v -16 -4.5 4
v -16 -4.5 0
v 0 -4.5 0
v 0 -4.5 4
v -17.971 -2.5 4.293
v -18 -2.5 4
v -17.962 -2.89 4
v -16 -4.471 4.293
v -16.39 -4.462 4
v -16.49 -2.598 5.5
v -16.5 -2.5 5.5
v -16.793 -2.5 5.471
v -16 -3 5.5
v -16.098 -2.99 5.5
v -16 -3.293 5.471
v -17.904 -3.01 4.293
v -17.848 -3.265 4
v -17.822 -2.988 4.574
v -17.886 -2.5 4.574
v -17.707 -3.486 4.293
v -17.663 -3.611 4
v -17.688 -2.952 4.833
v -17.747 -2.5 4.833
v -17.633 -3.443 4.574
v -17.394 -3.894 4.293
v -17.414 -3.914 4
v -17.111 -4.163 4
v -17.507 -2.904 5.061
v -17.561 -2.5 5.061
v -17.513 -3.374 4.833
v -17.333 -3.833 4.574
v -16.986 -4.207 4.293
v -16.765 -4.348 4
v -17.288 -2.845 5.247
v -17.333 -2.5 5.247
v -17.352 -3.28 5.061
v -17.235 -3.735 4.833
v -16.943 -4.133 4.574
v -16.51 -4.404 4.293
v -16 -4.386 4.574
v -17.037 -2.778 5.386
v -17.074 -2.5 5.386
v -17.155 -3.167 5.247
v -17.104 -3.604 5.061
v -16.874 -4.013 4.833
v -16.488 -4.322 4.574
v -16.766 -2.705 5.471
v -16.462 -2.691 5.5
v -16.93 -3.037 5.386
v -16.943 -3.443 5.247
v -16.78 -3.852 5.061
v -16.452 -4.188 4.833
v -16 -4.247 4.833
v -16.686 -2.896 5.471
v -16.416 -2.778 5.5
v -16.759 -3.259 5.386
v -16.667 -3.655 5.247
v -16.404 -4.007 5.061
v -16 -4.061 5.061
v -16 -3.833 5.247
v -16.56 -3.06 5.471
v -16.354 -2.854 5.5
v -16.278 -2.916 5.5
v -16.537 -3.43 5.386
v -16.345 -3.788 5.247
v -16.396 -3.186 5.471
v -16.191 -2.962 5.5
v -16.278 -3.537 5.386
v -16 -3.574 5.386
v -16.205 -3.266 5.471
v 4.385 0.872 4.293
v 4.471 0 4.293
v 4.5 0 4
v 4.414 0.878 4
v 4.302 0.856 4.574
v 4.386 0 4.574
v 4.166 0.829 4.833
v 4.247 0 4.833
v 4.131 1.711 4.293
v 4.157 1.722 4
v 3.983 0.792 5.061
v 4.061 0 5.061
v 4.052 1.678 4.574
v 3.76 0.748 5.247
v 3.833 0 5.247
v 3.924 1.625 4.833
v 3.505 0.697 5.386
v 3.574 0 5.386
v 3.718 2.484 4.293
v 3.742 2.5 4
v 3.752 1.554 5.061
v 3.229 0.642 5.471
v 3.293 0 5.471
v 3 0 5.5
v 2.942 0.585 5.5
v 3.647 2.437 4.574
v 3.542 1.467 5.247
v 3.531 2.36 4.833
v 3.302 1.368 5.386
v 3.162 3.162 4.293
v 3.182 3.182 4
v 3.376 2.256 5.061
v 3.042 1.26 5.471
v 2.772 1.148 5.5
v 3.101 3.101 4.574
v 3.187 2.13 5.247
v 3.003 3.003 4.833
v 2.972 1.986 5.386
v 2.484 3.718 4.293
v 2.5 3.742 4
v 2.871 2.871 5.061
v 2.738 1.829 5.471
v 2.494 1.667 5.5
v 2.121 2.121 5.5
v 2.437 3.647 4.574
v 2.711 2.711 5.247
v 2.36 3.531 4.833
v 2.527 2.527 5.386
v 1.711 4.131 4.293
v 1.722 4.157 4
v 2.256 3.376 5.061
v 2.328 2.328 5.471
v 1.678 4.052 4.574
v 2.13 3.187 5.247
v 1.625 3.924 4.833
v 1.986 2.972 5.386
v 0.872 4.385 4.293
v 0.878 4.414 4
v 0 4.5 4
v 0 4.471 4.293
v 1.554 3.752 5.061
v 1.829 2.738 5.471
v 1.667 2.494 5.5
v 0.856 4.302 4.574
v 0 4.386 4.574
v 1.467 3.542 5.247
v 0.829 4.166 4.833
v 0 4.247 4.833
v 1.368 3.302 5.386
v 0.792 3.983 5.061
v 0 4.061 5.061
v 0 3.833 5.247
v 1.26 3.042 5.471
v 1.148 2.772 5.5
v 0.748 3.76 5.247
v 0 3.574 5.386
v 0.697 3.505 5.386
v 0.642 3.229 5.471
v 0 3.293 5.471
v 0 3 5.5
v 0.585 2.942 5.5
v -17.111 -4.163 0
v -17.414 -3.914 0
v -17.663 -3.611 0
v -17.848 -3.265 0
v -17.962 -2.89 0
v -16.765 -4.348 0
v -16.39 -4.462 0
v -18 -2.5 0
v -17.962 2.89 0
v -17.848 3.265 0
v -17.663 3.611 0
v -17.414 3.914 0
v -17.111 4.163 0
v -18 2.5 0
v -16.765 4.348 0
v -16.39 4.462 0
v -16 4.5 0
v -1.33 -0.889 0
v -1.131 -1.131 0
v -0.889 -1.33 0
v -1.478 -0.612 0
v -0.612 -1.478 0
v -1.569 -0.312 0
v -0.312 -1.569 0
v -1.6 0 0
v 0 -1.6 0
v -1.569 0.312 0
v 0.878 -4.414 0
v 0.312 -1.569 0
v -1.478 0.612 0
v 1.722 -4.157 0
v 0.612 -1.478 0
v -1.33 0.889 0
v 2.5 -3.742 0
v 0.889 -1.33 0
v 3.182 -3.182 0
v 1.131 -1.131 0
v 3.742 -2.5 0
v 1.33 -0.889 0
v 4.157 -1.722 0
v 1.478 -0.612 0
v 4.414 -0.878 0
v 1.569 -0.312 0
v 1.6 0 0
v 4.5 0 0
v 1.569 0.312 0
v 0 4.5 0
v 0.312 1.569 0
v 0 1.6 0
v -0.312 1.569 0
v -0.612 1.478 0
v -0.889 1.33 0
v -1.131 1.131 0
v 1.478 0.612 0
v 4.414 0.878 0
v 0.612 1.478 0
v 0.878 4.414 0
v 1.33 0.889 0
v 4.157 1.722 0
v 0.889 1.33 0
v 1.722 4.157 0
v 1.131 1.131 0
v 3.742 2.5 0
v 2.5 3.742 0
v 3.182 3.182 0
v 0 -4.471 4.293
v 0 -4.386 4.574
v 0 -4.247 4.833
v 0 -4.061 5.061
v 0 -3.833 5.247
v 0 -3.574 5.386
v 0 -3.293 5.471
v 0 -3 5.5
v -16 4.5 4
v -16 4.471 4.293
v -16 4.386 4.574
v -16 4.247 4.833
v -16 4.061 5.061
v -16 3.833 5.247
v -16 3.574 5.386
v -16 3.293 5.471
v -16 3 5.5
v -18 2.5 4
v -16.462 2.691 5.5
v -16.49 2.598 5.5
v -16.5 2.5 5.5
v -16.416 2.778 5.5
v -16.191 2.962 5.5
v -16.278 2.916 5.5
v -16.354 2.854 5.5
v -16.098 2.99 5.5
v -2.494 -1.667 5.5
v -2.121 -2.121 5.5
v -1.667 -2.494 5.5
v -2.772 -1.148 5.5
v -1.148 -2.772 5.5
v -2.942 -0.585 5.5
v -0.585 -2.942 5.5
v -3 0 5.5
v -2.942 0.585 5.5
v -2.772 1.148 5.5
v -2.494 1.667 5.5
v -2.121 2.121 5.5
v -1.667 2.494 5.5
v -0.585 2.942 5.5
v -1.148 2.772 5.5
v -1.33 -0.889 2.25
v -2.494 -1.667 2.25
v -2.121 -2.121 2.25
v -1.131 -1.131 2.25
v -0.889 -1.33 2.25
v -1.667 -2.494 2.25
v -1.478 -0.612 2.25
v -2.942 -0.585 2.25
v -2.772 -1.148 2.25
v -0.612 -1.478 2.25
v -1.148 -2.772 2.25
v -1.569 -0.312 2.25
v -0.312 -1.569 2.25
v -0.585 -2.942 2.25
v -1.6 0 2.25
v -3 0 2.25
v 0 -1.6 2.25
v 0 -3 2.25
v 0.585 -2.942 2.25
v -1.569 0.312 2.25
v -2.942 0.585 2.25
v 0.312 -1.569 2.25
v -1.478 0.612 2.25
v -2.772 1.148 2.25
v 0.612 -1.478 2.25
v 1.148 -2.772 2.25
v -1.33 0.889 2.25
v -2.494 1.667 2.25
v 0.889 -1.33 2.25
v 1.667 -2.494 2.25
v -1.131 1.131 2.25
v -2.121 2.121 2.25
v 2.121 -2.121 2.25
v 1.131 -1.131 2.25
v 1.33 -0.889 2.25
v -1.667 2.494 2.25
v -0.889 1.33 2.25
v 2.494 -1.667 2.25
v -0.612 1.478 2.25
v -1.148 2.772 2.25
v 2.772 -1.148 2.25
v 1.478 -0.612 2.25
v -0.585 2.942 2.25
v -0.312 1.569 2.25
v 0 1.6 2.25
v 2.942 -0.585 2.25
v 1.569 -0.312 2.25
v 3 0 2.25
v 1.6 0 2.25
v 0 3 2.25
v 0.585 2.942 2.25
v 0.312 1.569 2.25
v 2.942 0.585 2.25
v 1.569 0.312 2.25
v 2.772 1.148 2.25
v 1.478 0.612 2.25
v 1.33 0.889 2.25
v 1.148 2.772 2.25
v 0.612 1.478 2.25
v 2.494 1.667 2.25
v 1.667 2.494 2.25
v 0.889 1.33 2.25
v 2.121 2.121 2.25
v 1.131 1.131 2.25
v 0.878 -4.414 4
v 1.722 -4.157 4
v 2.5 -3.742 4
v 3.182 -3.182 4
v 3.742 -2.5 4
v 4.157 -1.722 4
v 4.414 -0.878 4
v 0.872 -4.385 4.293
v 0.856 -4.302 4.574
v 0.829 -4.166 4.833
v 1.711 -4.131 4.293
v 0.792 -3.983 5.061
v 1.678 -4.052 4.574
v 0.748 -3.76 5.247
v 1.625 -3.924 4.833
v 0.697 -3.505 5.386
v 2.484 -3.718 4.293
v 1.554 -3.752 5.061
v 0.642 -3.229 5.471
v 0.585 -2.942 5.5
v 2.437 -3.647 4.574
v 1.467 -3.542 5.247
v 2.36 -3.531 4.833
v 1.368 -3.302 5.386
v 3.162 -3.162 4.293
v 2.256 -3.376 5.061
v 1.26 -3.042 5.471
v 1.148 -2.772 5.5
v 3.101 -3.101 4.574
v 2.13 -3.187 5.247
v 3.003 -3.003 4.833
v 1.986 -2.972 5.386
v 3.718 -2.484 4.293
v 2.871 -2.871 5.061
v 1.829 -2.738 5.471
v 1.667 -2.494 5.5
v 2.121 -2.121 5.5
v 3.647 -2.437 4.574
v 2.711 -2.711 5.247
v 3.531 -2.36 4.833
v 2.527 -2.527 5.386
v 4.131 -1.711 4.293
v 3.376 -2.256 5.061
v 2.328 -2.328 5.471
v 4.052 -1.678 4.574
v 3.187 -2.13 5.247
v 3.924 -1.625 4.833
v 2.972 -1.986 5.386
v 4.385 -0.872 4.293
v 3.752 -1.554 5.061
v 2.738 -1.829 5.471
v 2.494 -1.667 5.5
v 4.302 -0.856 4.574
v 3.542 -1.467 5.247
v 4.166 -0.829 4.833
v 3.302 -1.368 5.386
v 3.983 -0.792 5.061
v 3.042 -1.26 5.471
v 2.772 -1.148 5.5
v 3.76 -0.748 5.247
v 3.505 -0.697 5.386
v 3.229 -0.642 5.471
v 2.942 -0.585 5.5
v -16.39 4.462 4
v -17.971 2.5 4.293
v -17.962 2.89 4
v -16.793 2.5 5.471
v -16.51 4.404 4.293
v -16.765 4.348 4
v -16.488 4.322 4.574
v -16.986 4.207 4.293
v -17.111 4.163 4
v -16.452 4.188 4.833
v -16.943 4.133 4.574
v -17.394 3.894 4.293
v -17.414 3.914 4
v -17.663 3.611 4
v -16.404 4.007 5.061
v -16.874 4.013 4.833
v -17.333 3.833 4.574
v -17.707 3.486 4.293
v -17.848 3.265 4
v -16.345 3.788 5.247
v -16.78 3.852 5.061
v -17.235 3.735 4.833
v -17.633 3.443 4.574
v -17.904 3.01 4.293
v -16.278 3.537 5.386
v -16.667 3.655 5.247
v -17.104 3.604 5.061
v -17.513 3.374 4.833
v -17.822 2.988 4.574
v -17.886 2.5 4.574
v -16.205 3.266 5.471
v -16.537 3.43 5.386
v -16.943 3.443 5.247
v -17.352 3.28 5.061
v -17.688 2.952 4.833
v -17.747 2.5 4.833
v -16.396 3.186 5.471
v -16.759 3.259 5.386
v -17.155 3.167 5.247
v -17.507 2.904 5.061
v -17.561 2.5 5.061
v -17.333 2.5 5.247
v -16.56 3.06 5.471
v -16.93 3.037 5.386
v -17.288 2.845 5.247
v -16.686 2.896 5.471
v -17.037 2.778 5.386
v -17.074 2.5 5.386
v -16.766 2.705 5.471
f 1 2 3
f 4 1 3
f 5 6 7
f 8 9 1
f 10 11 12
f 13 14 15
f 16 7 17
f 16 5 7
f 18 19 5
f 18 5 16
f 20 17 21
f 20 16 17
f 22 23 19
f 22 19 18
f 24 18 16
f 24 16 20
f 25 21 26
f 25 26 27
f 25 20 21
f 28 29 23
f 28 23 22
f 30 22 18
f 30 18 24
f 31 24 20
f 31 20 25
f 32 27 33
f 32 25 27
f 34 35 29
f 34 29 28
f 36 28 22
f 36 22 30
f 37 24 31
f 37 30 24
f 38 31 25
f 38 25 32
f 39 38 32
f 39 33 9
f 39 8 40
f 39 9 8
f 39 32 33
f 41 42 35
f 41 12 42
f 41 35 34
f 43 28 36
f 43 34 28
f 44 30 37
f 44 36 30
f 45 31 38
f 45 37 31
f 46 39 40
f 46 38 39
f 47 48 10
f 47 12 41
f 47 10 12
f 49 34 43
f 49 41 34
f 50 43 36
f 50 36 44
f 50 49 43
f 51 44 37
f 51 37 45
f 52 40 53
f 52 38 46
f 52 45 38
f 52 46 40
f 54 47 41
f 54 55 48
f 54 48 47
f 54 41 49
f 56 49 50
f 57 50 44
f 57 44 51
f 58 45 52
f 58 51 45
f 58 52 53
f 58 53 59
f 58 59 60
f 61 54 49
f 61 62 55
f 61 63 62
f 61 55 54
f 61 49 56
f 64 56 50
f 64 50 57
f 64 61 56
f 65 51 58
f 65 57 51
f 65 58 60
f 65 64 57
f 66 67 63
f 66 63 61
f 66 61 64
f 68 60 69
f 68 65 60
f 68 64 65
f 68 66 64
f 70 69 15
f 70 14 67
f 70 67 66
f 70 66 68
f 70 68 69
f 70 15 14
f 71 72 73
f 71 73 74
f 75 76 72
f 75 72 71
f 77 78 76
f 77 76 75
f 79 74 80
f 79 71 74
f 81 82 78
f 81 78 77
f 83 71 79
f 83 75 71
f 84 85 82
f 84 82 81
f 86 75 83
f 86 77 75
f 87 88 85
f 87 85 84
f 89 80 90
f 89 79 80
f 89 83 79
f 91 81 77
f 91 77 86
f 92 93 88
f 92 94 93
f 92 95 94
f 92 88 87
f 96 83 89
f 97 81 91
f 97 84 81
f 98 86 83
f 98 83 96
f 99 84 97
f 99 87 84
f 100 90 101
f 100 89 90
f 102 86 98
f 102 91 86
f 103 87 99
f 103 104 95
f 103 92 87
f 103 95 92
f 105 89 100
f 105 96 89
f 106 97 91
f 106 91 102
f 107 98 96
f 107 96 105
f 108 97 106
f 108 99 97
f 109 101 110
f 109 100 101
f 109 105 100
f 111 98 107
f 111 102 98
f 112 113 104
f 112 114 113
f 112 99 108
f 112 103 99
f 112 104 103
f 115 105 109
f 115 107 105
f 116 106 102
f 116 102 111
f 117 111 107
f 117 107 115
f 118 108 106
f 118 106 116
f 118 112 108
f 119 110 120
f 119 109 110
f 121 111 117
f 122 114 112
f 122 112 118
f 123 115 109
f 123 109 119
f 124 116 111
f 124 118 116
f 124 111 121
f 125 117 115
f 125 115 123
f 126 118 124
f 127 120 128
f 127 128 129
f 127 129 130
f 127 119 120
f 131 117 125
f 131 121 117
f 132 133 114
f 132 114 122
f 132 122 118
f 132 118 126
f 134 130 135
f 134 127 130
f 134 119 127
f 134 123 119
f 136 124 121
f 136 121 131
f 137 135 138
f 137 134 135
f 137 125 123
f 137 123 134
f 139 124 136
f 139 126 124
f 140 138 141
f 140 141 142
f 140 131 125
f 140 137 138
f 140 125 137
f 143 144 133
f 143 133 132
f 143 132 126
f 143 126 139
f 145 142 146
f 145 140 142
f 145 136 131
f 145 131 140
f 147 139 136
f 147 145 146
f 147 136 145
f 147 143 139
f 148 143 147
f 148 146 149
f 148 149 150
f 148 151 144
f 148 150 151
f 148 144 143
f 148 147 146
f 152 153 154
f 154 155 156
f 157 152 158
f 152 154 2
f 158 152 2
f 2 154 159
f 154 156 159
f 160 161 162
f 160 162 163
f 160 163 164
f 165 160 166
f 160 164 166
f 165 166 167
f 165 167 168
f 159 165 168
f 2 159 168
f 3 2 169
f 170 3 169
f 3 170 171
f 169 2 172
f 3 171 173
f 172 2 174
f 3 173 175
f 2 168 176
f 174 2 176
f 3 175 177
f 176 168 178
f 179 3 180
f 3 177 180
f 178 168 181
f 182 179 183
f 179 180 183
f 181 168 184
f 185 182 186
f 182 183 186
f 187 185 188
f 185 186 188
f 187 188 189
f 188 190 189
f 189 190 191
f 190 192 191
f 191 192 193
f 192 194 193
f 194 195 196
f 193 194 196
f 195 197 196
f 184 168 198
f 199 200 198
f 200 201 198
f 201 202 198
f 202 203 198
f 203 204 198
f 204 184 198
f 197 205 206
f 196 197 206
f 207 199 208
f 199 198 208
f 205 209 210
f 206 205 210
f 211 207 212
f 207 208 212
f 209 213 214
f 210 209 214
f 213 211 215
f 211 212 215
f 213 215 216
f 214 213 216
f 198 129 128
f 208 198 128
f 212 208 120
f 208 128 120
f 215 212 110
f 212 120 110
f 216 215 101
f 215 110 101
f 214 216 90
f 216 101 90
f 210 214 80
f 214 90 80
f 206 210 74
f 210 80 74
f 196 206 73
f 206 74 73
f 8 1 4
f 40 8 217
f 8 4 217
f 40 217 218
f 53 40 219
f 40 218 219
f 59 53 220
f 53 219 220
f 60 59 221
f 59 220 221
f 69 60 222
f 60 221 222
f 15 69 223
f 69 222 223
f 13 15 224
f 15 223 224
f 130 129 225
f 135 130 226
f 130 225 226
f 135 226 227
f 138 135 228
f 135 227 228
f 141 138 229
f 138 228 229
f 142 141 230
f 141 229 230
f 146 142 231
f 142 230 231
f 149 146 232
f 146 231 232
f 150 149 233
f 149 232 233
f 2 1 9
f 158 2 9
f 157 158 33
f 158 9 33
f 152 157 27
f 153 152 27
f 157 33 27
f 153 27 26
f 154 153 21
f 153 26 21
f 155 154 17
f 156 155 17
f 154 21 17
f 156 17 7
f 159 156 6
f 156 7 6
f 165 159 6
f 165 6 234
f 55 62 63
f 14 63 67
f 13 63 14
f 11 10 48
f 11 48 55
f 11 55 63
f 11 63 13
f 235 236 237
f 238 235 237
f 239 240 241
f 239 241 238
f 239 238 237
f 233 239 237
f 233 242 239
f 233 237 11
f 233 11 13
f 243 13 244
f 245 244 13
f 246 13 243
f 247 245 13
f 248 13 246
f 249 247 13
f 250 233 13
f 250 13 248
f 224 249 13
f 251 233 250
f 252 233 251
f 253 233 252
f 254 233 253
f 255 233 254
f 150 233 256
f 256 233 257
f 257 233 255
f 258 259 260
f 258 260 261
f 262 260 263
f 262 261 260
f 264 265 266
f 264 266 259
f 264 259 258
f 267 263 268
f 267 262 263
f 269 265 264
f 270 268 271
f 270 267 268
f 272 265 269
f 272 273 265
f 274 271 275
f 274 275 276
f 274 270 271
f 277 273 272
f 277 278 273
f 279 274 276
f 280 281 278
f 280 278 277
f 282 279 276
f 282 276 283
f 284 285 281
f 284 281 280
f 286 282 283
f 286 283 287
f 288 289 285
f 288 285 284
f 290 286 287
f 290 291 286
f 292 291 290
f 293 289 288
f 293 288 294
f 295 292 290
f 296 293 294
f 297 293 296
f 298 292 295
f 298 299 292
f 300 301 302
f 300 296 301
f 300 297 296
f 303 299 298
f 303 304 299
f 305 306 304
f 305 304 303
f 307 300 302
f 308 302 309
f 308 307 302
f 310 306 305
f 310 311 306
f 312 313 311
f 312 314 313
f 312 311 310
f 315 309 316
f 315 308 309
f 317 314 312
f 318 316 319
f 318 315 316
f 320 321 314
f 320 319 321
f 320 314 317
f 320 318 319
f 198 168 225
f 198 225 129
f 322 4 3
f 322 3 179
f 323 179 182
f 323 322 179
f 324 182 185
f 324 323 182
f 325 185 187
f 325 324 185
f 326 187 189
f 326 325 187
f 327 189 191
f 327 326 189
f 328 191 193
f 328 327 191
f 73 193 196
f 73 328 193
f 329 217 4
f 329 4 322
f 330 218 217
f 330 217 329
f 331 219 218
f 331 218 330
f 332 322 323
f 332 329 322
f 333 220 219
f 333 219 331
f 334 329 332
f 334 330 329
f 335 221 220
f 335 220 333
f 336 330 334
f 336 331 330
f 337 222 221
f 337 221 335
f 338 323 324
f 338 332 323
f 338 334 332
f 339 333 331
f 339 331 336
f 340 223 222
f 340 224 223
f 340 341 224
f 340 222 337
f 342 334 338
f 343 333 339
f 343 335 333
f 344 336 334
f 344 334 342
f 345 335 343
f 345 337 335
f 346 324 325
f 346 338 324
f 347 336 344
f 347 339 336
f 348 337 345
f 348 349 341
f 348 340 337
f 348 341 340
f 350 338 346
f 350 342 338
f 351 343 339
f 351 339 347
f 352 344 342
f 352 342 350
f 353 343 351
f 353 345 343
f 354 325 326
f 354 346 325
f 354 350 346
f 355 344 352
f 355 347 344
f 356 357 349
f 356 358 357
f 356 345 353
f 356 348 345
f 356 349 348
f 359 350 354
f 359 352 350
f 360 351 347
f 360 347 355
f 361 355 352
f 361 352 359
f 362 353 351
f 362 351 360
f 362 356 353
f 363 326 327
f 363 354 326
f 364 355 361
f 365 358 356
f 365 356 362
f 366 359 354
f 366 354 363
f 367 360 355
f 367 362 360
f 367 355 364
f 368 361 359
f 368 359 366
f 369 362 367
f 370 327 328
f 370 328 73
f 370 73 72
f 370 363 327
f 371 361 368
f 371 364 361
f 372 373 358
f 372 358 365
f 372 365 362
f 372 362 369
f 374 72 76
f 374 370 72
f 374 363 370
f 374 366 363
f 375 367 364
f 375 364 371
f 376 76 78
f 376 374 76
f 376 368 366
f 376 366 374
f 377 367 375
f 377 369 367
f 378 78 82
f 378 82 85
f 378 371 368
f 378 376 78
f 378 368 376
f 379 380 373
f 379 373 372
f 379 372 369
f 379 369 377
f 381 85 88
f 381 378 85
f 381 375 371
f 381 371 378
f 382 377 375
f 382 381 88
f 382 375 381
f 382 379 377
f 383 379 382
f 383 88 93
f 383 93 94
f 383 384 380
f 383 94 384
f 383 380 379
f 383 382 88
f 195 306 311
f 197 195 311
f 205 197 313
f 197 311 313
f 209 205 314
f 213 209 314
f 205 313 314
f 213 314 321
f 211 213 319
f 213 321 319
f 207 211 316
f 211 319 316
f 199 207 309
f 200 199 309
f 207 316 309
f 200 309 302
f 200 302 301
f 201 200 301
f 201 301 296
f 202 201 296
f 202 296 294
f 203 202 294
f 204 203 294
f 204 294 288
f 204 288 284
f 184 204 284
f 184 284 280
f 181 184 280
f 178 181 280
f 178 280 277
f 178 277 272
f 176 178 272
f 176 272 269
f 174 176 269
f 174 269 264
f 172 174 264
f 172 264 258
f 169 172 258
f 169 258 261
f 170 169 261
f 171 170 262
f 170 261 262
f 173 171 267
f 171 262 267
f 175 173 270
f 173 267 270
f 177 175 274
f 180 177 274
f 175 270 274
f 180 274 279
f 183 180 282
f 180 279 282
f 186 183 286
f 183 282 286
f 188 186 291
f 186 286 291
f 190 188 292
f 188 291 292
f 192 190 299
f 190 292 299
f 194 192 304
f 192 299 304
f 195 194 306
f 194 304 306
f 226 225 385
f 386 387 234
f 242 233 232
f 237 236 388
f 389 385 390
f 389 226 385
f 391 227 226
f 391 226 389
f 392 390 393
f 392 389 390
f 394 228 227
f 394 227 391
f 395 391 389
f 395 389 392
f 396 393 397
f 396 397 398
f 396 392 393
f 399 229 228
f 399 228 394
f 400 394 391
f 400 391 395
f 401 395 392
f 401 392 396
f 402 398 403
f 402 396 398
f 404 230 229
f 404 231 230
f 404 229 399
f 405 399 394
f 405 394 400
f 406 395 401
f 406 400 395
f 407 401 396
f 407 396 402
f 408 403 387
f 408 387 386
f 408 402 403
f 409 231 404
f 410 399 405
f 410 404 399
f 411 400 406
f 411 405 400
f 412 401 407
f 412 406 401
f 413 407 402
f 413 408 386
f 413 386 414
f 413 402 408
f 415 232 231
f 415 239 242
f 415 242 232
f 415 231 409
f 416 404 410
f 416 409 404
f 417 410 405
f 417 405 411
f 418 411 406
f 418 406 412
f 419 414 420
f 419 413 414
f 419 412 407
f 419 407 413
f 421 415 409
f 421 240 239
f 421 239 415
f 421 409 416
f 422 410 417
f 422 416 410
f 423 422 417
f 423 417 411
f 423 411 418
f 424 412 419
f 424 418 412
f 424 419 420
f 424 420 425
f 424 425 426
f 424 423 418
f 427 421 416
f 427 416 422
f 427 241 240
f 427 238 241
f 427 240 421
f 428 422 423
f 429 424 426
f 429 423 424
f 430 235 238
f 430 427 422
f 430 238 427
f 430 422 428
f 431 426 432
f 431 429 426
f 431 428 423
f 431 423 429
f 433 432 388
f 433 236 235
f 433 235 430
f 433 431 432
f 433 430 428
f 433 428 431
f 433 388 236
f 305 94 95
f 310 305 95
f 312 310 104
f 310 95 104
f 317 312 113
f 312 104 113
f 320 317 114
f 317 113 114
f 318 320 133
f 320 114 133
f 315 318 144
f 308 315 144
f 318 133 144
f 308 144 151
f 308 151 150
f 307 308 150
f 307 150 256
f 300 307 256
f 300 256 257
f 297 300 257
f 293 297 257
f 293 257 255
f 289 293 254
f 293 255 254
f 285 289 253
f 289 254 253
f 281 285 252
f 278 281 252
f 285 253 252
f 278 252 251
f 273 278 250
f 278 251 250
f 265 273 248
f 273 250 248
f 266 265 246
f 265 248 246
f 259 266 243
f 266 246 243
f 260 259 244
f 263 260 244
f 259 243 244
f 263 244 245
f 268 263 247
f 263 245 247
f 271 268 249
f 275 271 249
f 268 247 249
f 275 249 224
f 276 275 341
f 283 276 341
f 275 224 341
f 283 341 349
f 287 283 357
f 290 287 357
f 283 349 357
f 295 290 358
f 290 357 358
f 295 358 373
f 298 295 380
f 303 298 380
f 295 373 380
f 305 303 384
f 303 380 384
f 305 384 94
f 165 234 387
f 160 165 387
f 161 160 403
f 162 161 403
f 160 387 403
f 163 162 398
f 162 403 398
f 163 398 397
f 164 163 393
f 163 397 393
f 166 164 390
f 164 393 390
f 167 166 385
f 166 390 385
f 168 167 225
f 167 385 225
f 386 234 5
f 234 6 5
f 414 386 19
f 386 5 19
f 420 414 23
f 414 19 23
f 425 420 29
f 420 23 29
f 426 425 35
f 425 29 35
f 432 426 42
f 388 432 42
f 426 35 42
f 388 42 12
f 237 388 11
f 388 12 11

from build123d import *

# Parameters (mm, degrees)
F0_W     = 22.5
F0_H     = 9
F1_DEPTH = 5.5
F2_R     = 3
F3_DEPTH = 3.25
F4_R     = 1.6
F5_DEPTH = 2.5
F6_R     = 4.49999
F7_R     = 2
F8_R     = 1.49999


# Not quite as in the source:
# - a fillet or chamfer is up to 0.001 mm smaller than in the source, because OpenCascade refuses the exact size


with BuildPart() as f1:
    # F0 (on Top) → F1 (new body)
    with BuildSketch(Plane.XY):
        with Locations((-6.75, 0)):
            Rectangle(F0_W, F0_H)
    extrude(amount=F1_DEPTH)

    # F2 (on face) → F3 (cut)
    with BuildSketch(Plane.XY.offset(5.5)):
        Circle(F2_R)
    extrude(amount=-F3_DEPTH, mode=Mode.SUBTRACT)

    # F4 (on face) → F5 (cut)
    with BuildSketch(Plane.XY.offset(2.25)):
        Circle(F4_R)
    extrude(amount=-F5_DEPTH, mode=Mode.SUBTRACT)

    # F6 (radius 4.5 in the source; OpenCascade refuses exactly that, so slightly less here)
    f6_edges = [f1.edges().sort_by_distance(p)[0] for p in [
        (4.5, -4.5, 2.75),
        (4.5, 4.5, 2.75),
    ]]
    fillet(f6_edges, radius=F6_R)

    # F7
    f7_edges = [f1.edges().sort_by_distance(p)[0] for p in [
        (-18, 4.5, 2.75),
        (-18, -4.5, 2.75),
    ]]
    fillet(f7_edges, radius=F7_R)

    # F8 (radius 1.5 in the source; OpenCascade refuses exactly that, so slightly less here)
    f8_edges = [f1.edges().sort_by_distance(p)[0] for p in [
        (-7.999995, -4.5, 5.5),
    ]]
    fillet(f8_edges, radius=F8_R)


solid = f1.part
